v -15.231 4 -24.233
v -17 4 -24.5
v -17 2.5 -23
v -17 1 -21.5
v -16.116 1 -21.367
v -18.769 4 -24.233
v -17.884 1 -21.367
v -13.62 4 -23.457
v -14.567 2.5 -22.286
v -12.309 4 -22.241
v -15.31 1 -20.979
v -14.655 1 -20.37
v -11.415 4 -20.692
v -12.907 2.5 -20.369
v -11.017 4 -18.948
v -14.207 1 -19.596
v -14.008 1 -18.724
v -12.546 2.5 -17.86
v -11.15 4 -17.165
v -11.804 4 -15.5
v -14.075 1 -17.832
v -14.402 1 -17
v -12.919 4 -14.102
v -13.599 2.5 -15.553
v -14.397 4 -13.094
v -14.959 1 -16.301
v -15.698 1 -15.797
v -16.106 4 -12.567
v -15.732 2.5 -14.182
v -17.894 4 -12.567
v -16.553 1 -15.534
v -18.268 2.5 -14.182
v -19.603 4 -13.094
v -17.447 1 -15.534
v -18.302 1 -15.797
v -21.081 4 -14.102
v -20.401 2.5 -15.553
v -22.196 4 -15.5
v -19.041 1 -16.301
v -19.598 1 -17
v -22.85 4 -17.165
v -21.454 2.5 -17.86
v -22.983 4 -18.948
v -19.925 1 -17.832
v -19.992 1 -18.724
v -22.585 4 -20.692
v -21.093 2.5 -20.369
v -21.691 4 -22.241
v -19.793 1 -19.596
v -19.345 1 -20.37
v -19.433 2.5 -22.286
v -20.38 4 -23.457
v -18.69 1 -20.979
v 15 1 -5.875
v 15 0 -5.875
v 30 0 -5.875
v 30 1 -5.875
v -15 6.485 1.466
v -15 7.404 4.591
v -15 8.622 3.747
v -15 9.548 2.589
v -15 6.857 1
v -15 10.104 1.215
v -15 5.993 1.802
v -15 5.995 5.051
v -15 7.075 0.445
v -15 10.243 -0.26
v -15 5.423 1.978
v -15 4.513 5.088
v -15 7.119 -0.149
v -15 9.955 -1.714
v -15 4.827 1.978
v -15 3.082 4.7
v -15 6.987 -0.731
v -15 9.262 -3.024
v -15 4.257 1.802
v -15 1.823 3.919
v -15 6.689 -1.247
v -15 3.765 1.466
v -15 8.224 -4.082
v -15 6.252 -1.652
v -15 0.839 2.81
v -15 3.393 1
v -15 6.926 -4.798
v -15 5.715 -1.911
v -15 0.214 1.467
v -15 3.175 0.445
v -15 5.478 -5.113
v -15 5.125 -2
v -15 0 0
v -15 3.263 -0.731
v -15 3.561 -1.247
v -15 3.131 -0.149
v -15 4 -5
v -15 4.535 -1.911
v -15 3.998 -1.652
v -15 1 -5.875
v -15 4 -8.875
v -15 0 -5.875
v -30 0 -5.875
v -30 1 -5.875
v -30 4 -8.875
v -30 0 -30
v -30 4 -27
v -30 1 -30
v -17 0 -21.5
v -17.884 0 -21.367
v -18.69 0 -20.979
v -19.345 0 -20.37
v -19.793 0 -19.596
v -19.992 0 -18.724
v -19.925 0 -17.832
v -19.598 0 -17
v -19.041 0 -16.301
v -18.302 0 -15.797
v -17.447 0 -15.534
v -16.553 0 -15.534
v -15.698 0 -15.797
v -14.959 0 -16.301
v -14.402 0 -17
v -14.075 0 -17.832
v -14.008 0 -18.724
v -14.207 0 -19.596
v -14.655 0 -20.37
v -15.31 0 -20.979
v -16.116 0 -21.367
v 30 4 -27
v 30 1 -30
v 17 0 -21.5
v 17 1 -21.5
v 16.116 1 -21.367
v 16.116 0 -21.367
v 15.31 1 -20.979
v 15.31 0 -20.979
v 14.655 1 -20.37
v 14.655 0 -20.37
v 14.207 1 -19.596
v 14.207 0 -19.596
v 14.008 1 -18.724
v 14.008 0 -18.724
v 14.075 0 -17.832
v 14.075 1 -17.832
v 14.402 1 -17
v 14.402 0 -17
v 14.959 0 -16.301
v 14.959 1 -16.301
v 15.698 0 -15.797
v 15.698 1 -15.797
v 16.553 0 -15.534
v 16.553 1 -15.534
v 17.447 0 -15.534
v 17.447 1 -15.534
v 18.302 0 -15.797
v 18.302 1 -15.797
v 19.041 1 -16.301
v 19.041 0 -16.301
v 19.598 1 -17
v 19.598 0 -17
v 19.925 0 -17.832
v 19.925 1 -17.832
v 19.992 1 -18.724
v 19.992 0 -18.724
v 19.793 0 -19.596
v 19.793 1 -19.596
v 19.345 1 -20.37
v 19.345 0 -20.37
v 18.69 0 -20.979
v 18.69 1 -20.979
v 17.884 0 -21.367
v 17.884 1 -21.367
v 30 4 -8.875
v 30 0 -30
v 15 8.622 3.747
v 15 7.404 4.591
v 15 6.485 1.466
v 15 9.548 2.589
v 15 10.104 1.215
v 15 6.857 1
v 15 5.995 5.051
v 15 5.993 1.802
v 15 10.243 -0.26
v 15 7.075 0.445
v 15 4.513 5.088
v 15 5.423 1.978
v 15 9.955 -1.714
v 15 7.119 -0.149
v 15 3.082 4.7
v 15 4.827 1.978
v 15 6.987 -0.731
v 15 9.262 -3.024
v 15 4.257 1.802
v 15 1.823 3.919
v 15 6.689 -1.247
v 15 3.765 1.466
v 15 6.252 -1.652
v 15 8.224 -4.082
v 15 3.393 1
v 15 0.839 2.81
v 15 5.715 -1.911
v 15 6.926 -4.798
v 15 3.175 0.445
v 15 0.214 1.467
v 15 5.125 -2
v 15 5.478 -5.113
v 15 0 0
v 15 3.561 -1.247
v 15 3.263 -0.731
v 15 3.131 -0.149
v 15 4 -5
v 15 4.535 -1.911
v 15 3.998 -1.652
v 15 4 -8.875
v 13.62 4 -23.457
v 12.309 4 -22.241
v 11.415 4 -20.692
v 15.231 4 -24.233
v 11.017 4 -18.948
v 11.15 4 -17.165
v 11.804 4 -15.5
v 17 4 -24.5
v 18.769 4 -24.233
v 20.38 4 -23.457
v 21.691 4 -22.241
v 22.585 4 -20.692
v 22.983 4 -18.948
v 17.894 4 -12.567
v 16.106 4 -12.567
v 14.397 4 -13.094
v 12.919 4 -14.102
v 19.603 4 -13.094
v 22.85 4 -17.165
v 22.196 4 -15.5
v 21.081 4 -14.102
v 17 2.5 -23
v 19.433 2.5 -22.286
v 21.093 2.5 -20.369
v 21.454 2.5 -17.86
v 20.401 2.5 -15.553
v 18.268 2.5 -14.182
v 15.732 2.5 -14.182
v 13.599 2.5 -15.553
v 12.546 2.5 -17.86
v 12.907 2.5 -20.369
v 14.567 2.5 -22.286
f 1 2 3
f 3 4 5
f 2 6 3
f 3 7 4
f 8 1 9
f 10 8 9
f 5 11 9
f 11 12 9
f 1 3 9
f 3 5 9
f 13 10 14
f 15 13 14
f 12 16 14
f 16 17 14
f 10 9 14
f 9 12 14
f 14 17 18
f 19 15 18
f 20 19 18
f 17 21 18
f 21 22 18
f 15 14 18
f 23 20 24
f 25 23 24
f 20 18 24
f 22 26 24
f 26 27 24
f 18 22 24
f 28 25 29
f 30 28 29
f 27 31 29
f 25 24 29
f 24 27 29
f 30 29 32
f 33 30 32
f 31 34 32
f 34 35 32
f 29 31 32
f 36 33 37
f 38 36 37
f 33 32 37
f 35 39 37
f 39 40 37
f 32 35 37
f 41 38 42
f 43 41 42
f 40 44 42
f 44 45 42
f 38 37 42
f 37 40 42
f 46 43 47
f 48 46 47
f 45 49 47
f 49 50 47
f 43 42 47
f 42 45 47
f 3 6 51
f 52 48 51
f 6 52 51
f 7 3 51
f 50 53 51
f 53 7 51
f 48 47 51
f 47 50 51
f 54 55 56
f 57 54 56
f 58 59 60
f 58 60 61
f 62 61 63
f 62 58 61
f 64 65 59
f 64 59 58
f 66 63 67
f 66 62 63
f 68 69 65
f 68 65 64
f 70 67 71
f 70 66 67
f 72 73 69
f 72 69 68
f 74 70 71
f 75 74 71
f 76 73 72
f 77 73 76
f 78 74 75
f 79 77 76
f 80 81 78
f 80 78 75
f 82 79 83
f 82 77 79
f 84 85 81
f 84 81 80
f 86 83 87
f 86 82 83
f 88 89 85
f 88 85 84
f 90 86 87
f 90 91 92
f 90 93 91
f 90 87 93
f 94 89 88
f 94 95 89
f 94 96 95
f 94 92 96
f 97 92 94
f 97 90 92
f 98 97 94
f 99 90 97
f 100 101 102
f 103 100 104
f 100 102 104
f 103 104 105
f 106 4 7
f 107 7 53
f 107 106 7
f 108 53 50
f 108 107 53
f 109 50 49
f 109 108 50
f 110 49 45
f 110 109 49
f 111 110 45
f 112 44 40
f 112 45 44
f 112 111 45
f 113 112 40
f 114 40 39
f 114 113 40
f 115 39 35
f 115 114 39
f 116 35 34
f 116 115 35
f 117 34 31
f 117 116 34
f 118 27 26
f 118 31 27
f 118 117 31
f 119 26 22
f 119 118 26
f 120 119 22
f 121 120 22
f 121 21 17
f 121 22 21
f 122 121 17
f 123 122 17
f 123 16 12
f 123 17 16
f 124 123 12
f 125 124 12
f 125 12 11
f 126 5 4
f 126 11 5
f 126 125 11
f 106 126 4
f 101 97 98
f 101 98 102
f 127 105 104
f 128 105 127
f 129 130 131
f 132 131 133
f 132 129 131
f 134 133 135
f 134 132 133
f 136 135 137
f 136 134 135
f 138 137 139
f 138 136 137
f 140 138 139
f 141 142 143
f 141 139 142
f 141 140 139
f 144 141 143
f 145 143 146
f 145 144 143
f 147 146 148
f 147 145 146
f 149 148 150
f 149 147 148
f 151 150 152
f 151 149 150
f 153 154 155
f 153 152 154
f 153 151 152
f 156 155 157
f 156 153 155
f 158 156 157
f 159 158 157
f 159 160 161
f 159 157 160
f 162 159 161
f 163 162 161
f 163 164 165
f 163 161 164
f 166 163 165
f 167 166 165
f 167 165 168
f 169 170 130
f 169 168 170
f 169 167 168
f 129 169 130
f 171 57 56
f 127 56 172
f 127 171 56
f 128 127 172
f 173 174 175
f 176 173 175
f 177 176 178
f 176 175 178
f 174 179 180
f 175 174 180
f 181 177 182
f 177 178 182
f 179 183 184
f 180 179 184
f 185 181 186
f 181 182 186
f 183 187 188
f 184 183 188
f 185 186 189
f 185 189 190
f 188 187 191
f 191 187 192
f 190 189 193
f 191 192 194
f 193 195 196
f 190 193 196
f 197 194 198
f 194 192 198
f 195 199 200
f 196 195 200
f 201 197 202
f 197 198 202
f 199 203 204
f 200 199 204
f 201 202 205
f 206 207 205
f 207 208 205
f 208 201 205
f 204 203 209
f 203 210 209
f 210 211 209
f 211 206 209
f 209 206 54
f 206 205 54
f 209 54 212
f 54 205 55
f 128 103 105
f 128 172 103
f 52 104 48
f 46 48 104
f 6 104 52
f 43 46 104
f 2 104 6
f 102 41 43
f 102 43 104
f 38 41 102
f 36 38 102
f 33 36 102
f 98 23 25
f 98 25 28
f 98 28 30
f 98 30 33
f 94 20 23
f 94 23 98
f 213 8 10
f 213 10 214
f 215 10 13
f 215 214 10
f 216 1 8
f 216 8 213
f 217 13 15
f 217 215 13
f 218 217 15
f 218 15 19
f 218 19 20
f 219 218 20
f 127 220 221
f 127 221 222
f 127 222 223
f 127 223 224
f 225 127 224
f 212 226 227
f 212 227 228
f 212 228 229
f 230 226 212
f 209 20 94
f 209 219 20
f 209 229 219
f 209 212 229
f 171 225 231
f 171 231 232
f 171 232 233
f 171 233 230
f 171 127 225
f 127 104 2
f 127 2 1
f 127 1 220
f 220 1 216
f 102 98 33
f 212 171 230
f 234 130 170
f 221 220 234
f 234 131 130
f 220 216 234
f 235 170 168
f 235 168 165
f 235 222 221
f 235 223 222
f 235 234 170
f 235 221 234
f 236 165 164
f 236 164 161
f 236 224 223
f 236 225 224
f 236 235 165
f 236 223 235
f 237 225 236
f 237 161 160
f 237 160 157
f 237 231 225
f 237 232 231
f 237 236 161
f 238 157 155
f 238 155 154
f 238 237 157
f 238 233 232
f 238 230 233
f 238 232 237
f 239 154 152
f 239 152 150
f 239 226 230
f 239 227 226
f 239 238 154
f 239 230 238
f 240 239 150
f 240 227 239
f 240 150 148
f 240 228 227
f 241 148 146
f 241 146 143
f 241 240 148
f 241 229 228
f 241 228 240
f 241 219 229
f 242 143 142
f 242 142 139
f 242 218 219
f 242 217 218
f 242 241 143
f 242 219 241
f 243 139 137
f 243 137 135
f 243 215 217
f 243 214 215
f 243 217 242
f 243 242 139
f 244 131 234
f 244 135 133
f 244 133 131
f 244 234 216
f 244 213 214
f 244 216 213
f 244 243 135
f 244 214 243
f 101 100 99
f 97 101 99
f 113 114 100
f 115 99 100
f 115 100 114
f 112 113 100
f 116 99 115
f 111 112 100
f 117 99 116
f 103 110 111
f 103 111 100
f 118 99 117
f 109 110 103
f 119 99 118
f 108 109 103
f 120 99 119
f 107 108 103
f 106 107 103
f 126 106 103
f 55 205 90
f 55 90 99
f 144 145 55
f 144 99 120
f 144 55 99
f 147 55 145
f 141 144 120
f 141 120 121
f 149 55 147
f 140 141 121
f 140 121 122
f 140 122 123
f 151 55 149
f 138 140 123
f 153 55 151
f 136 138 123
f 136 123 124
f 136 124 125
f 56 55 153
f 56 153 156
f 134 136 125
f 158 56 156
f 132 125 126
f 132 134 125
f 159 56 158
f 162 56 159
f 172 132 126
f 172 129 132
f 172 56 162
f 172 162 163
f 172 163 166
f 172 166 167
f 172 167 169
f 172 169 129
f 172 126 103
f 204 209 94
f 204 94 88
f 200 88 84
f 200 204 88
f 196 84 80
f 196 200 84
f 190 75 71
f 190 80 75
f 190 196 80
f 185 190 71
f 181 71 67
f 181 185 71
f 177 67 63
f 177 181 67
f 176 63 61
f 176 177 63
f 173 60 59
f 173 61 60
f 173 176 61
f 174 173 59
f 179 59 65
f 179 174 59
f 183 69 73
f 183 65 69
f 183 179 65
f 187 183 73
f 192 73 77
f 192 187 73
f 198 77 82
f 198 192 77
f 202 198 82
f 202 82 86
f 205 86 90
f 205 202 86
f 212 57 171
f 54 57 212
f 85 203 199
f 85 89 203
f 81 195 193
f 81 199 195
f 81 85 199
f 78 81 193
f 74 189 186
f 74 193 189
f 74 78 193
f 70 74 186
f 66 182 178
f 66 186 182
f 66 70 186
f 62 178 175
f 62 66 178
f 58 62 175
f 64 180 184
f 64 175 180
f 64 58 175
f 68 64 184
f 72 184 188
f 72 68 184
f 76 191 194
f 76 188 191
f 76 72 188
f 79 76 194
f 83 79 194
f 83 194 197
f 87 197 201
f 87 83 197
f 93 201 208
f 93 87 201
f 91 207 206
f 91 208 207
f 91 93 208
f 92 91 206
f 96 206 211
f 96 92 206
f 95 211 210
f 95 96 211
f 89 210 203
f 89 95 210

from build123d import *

# Parameters (mm, degrees)
SKETCH_1_R          = 2
EXTRUDE_1_DEPTH     = 30
SKETCH_2_R          = 3
SKETCH_2_W          = 15
SKETCH_2_H          = 11
CUT_EXTRUDE_1_DEPTH = 44.647021662
CHAMFER_1_SIZE      = 3


with BuildPart() as part:
    # 草图1 → 凸台-拉伸1 (new, symmetric)
    with BuildSketch(Plane(origin=(0, 0, 0), x_dir=(0, 0, -1), z_dir=(1, 0, 0))):
        with BuildLine():
            Line((0, 0), (30, 0))
            Line((30, 0), (30, 4))
            Line((30, 4), (5, 4))
            ThreePointArc((5, 4), (-3.201562119, 9.126952648), (0, 0))
        make_face()
        with Locations((0, 5.125)):
            Circle(SKETCH_1_R, mode=Mode.SUBTRACT)
    extrude(amount=EXTRUDE_1_DEPTH, both=True)

    # 草图2 → 切除-拉伸1 (cut, through all)
    with BuildSketch(Plane(origin=(0, 0, 0), x_dir=(1, 0, 0), z_dir=(0, 1, 0))):
        with Locations(Location((-17, 18.5, 0), (0, 0, 90))):
            Circle(SKETCH_2_R)
        with Locations(Location((17, 18.5, 0), (0, 0, 90))):
            Circle(SKETCH_2_R)
        with Locations((22.5, 0.375)):
            Rectangle(SKETCH_2_W, SKETCH_2_H)
        with Locations((-22.5, 0.375)):
            Rectangle(SKETCH_2_W, SKETCH_2_H)
    extrude(amount=CUT_EXTRUDE_1_DEPTH, mode=Mode.SUBTRACT)

    # 倒角1
    chamfer_1_edges = [part.edges().sort_by_distance(p)[0] for p in [
        (22.5, 4, -5.875),
        (-22.5, 4, -5.875),
        (17, 4, -15.5),
        (-17, 4, -15.5),
        (0, 4, -30),
    ]]
    chamfer(chamfer_1_edges, length=CHAMFER_1_SIZE)


solid = part.part
